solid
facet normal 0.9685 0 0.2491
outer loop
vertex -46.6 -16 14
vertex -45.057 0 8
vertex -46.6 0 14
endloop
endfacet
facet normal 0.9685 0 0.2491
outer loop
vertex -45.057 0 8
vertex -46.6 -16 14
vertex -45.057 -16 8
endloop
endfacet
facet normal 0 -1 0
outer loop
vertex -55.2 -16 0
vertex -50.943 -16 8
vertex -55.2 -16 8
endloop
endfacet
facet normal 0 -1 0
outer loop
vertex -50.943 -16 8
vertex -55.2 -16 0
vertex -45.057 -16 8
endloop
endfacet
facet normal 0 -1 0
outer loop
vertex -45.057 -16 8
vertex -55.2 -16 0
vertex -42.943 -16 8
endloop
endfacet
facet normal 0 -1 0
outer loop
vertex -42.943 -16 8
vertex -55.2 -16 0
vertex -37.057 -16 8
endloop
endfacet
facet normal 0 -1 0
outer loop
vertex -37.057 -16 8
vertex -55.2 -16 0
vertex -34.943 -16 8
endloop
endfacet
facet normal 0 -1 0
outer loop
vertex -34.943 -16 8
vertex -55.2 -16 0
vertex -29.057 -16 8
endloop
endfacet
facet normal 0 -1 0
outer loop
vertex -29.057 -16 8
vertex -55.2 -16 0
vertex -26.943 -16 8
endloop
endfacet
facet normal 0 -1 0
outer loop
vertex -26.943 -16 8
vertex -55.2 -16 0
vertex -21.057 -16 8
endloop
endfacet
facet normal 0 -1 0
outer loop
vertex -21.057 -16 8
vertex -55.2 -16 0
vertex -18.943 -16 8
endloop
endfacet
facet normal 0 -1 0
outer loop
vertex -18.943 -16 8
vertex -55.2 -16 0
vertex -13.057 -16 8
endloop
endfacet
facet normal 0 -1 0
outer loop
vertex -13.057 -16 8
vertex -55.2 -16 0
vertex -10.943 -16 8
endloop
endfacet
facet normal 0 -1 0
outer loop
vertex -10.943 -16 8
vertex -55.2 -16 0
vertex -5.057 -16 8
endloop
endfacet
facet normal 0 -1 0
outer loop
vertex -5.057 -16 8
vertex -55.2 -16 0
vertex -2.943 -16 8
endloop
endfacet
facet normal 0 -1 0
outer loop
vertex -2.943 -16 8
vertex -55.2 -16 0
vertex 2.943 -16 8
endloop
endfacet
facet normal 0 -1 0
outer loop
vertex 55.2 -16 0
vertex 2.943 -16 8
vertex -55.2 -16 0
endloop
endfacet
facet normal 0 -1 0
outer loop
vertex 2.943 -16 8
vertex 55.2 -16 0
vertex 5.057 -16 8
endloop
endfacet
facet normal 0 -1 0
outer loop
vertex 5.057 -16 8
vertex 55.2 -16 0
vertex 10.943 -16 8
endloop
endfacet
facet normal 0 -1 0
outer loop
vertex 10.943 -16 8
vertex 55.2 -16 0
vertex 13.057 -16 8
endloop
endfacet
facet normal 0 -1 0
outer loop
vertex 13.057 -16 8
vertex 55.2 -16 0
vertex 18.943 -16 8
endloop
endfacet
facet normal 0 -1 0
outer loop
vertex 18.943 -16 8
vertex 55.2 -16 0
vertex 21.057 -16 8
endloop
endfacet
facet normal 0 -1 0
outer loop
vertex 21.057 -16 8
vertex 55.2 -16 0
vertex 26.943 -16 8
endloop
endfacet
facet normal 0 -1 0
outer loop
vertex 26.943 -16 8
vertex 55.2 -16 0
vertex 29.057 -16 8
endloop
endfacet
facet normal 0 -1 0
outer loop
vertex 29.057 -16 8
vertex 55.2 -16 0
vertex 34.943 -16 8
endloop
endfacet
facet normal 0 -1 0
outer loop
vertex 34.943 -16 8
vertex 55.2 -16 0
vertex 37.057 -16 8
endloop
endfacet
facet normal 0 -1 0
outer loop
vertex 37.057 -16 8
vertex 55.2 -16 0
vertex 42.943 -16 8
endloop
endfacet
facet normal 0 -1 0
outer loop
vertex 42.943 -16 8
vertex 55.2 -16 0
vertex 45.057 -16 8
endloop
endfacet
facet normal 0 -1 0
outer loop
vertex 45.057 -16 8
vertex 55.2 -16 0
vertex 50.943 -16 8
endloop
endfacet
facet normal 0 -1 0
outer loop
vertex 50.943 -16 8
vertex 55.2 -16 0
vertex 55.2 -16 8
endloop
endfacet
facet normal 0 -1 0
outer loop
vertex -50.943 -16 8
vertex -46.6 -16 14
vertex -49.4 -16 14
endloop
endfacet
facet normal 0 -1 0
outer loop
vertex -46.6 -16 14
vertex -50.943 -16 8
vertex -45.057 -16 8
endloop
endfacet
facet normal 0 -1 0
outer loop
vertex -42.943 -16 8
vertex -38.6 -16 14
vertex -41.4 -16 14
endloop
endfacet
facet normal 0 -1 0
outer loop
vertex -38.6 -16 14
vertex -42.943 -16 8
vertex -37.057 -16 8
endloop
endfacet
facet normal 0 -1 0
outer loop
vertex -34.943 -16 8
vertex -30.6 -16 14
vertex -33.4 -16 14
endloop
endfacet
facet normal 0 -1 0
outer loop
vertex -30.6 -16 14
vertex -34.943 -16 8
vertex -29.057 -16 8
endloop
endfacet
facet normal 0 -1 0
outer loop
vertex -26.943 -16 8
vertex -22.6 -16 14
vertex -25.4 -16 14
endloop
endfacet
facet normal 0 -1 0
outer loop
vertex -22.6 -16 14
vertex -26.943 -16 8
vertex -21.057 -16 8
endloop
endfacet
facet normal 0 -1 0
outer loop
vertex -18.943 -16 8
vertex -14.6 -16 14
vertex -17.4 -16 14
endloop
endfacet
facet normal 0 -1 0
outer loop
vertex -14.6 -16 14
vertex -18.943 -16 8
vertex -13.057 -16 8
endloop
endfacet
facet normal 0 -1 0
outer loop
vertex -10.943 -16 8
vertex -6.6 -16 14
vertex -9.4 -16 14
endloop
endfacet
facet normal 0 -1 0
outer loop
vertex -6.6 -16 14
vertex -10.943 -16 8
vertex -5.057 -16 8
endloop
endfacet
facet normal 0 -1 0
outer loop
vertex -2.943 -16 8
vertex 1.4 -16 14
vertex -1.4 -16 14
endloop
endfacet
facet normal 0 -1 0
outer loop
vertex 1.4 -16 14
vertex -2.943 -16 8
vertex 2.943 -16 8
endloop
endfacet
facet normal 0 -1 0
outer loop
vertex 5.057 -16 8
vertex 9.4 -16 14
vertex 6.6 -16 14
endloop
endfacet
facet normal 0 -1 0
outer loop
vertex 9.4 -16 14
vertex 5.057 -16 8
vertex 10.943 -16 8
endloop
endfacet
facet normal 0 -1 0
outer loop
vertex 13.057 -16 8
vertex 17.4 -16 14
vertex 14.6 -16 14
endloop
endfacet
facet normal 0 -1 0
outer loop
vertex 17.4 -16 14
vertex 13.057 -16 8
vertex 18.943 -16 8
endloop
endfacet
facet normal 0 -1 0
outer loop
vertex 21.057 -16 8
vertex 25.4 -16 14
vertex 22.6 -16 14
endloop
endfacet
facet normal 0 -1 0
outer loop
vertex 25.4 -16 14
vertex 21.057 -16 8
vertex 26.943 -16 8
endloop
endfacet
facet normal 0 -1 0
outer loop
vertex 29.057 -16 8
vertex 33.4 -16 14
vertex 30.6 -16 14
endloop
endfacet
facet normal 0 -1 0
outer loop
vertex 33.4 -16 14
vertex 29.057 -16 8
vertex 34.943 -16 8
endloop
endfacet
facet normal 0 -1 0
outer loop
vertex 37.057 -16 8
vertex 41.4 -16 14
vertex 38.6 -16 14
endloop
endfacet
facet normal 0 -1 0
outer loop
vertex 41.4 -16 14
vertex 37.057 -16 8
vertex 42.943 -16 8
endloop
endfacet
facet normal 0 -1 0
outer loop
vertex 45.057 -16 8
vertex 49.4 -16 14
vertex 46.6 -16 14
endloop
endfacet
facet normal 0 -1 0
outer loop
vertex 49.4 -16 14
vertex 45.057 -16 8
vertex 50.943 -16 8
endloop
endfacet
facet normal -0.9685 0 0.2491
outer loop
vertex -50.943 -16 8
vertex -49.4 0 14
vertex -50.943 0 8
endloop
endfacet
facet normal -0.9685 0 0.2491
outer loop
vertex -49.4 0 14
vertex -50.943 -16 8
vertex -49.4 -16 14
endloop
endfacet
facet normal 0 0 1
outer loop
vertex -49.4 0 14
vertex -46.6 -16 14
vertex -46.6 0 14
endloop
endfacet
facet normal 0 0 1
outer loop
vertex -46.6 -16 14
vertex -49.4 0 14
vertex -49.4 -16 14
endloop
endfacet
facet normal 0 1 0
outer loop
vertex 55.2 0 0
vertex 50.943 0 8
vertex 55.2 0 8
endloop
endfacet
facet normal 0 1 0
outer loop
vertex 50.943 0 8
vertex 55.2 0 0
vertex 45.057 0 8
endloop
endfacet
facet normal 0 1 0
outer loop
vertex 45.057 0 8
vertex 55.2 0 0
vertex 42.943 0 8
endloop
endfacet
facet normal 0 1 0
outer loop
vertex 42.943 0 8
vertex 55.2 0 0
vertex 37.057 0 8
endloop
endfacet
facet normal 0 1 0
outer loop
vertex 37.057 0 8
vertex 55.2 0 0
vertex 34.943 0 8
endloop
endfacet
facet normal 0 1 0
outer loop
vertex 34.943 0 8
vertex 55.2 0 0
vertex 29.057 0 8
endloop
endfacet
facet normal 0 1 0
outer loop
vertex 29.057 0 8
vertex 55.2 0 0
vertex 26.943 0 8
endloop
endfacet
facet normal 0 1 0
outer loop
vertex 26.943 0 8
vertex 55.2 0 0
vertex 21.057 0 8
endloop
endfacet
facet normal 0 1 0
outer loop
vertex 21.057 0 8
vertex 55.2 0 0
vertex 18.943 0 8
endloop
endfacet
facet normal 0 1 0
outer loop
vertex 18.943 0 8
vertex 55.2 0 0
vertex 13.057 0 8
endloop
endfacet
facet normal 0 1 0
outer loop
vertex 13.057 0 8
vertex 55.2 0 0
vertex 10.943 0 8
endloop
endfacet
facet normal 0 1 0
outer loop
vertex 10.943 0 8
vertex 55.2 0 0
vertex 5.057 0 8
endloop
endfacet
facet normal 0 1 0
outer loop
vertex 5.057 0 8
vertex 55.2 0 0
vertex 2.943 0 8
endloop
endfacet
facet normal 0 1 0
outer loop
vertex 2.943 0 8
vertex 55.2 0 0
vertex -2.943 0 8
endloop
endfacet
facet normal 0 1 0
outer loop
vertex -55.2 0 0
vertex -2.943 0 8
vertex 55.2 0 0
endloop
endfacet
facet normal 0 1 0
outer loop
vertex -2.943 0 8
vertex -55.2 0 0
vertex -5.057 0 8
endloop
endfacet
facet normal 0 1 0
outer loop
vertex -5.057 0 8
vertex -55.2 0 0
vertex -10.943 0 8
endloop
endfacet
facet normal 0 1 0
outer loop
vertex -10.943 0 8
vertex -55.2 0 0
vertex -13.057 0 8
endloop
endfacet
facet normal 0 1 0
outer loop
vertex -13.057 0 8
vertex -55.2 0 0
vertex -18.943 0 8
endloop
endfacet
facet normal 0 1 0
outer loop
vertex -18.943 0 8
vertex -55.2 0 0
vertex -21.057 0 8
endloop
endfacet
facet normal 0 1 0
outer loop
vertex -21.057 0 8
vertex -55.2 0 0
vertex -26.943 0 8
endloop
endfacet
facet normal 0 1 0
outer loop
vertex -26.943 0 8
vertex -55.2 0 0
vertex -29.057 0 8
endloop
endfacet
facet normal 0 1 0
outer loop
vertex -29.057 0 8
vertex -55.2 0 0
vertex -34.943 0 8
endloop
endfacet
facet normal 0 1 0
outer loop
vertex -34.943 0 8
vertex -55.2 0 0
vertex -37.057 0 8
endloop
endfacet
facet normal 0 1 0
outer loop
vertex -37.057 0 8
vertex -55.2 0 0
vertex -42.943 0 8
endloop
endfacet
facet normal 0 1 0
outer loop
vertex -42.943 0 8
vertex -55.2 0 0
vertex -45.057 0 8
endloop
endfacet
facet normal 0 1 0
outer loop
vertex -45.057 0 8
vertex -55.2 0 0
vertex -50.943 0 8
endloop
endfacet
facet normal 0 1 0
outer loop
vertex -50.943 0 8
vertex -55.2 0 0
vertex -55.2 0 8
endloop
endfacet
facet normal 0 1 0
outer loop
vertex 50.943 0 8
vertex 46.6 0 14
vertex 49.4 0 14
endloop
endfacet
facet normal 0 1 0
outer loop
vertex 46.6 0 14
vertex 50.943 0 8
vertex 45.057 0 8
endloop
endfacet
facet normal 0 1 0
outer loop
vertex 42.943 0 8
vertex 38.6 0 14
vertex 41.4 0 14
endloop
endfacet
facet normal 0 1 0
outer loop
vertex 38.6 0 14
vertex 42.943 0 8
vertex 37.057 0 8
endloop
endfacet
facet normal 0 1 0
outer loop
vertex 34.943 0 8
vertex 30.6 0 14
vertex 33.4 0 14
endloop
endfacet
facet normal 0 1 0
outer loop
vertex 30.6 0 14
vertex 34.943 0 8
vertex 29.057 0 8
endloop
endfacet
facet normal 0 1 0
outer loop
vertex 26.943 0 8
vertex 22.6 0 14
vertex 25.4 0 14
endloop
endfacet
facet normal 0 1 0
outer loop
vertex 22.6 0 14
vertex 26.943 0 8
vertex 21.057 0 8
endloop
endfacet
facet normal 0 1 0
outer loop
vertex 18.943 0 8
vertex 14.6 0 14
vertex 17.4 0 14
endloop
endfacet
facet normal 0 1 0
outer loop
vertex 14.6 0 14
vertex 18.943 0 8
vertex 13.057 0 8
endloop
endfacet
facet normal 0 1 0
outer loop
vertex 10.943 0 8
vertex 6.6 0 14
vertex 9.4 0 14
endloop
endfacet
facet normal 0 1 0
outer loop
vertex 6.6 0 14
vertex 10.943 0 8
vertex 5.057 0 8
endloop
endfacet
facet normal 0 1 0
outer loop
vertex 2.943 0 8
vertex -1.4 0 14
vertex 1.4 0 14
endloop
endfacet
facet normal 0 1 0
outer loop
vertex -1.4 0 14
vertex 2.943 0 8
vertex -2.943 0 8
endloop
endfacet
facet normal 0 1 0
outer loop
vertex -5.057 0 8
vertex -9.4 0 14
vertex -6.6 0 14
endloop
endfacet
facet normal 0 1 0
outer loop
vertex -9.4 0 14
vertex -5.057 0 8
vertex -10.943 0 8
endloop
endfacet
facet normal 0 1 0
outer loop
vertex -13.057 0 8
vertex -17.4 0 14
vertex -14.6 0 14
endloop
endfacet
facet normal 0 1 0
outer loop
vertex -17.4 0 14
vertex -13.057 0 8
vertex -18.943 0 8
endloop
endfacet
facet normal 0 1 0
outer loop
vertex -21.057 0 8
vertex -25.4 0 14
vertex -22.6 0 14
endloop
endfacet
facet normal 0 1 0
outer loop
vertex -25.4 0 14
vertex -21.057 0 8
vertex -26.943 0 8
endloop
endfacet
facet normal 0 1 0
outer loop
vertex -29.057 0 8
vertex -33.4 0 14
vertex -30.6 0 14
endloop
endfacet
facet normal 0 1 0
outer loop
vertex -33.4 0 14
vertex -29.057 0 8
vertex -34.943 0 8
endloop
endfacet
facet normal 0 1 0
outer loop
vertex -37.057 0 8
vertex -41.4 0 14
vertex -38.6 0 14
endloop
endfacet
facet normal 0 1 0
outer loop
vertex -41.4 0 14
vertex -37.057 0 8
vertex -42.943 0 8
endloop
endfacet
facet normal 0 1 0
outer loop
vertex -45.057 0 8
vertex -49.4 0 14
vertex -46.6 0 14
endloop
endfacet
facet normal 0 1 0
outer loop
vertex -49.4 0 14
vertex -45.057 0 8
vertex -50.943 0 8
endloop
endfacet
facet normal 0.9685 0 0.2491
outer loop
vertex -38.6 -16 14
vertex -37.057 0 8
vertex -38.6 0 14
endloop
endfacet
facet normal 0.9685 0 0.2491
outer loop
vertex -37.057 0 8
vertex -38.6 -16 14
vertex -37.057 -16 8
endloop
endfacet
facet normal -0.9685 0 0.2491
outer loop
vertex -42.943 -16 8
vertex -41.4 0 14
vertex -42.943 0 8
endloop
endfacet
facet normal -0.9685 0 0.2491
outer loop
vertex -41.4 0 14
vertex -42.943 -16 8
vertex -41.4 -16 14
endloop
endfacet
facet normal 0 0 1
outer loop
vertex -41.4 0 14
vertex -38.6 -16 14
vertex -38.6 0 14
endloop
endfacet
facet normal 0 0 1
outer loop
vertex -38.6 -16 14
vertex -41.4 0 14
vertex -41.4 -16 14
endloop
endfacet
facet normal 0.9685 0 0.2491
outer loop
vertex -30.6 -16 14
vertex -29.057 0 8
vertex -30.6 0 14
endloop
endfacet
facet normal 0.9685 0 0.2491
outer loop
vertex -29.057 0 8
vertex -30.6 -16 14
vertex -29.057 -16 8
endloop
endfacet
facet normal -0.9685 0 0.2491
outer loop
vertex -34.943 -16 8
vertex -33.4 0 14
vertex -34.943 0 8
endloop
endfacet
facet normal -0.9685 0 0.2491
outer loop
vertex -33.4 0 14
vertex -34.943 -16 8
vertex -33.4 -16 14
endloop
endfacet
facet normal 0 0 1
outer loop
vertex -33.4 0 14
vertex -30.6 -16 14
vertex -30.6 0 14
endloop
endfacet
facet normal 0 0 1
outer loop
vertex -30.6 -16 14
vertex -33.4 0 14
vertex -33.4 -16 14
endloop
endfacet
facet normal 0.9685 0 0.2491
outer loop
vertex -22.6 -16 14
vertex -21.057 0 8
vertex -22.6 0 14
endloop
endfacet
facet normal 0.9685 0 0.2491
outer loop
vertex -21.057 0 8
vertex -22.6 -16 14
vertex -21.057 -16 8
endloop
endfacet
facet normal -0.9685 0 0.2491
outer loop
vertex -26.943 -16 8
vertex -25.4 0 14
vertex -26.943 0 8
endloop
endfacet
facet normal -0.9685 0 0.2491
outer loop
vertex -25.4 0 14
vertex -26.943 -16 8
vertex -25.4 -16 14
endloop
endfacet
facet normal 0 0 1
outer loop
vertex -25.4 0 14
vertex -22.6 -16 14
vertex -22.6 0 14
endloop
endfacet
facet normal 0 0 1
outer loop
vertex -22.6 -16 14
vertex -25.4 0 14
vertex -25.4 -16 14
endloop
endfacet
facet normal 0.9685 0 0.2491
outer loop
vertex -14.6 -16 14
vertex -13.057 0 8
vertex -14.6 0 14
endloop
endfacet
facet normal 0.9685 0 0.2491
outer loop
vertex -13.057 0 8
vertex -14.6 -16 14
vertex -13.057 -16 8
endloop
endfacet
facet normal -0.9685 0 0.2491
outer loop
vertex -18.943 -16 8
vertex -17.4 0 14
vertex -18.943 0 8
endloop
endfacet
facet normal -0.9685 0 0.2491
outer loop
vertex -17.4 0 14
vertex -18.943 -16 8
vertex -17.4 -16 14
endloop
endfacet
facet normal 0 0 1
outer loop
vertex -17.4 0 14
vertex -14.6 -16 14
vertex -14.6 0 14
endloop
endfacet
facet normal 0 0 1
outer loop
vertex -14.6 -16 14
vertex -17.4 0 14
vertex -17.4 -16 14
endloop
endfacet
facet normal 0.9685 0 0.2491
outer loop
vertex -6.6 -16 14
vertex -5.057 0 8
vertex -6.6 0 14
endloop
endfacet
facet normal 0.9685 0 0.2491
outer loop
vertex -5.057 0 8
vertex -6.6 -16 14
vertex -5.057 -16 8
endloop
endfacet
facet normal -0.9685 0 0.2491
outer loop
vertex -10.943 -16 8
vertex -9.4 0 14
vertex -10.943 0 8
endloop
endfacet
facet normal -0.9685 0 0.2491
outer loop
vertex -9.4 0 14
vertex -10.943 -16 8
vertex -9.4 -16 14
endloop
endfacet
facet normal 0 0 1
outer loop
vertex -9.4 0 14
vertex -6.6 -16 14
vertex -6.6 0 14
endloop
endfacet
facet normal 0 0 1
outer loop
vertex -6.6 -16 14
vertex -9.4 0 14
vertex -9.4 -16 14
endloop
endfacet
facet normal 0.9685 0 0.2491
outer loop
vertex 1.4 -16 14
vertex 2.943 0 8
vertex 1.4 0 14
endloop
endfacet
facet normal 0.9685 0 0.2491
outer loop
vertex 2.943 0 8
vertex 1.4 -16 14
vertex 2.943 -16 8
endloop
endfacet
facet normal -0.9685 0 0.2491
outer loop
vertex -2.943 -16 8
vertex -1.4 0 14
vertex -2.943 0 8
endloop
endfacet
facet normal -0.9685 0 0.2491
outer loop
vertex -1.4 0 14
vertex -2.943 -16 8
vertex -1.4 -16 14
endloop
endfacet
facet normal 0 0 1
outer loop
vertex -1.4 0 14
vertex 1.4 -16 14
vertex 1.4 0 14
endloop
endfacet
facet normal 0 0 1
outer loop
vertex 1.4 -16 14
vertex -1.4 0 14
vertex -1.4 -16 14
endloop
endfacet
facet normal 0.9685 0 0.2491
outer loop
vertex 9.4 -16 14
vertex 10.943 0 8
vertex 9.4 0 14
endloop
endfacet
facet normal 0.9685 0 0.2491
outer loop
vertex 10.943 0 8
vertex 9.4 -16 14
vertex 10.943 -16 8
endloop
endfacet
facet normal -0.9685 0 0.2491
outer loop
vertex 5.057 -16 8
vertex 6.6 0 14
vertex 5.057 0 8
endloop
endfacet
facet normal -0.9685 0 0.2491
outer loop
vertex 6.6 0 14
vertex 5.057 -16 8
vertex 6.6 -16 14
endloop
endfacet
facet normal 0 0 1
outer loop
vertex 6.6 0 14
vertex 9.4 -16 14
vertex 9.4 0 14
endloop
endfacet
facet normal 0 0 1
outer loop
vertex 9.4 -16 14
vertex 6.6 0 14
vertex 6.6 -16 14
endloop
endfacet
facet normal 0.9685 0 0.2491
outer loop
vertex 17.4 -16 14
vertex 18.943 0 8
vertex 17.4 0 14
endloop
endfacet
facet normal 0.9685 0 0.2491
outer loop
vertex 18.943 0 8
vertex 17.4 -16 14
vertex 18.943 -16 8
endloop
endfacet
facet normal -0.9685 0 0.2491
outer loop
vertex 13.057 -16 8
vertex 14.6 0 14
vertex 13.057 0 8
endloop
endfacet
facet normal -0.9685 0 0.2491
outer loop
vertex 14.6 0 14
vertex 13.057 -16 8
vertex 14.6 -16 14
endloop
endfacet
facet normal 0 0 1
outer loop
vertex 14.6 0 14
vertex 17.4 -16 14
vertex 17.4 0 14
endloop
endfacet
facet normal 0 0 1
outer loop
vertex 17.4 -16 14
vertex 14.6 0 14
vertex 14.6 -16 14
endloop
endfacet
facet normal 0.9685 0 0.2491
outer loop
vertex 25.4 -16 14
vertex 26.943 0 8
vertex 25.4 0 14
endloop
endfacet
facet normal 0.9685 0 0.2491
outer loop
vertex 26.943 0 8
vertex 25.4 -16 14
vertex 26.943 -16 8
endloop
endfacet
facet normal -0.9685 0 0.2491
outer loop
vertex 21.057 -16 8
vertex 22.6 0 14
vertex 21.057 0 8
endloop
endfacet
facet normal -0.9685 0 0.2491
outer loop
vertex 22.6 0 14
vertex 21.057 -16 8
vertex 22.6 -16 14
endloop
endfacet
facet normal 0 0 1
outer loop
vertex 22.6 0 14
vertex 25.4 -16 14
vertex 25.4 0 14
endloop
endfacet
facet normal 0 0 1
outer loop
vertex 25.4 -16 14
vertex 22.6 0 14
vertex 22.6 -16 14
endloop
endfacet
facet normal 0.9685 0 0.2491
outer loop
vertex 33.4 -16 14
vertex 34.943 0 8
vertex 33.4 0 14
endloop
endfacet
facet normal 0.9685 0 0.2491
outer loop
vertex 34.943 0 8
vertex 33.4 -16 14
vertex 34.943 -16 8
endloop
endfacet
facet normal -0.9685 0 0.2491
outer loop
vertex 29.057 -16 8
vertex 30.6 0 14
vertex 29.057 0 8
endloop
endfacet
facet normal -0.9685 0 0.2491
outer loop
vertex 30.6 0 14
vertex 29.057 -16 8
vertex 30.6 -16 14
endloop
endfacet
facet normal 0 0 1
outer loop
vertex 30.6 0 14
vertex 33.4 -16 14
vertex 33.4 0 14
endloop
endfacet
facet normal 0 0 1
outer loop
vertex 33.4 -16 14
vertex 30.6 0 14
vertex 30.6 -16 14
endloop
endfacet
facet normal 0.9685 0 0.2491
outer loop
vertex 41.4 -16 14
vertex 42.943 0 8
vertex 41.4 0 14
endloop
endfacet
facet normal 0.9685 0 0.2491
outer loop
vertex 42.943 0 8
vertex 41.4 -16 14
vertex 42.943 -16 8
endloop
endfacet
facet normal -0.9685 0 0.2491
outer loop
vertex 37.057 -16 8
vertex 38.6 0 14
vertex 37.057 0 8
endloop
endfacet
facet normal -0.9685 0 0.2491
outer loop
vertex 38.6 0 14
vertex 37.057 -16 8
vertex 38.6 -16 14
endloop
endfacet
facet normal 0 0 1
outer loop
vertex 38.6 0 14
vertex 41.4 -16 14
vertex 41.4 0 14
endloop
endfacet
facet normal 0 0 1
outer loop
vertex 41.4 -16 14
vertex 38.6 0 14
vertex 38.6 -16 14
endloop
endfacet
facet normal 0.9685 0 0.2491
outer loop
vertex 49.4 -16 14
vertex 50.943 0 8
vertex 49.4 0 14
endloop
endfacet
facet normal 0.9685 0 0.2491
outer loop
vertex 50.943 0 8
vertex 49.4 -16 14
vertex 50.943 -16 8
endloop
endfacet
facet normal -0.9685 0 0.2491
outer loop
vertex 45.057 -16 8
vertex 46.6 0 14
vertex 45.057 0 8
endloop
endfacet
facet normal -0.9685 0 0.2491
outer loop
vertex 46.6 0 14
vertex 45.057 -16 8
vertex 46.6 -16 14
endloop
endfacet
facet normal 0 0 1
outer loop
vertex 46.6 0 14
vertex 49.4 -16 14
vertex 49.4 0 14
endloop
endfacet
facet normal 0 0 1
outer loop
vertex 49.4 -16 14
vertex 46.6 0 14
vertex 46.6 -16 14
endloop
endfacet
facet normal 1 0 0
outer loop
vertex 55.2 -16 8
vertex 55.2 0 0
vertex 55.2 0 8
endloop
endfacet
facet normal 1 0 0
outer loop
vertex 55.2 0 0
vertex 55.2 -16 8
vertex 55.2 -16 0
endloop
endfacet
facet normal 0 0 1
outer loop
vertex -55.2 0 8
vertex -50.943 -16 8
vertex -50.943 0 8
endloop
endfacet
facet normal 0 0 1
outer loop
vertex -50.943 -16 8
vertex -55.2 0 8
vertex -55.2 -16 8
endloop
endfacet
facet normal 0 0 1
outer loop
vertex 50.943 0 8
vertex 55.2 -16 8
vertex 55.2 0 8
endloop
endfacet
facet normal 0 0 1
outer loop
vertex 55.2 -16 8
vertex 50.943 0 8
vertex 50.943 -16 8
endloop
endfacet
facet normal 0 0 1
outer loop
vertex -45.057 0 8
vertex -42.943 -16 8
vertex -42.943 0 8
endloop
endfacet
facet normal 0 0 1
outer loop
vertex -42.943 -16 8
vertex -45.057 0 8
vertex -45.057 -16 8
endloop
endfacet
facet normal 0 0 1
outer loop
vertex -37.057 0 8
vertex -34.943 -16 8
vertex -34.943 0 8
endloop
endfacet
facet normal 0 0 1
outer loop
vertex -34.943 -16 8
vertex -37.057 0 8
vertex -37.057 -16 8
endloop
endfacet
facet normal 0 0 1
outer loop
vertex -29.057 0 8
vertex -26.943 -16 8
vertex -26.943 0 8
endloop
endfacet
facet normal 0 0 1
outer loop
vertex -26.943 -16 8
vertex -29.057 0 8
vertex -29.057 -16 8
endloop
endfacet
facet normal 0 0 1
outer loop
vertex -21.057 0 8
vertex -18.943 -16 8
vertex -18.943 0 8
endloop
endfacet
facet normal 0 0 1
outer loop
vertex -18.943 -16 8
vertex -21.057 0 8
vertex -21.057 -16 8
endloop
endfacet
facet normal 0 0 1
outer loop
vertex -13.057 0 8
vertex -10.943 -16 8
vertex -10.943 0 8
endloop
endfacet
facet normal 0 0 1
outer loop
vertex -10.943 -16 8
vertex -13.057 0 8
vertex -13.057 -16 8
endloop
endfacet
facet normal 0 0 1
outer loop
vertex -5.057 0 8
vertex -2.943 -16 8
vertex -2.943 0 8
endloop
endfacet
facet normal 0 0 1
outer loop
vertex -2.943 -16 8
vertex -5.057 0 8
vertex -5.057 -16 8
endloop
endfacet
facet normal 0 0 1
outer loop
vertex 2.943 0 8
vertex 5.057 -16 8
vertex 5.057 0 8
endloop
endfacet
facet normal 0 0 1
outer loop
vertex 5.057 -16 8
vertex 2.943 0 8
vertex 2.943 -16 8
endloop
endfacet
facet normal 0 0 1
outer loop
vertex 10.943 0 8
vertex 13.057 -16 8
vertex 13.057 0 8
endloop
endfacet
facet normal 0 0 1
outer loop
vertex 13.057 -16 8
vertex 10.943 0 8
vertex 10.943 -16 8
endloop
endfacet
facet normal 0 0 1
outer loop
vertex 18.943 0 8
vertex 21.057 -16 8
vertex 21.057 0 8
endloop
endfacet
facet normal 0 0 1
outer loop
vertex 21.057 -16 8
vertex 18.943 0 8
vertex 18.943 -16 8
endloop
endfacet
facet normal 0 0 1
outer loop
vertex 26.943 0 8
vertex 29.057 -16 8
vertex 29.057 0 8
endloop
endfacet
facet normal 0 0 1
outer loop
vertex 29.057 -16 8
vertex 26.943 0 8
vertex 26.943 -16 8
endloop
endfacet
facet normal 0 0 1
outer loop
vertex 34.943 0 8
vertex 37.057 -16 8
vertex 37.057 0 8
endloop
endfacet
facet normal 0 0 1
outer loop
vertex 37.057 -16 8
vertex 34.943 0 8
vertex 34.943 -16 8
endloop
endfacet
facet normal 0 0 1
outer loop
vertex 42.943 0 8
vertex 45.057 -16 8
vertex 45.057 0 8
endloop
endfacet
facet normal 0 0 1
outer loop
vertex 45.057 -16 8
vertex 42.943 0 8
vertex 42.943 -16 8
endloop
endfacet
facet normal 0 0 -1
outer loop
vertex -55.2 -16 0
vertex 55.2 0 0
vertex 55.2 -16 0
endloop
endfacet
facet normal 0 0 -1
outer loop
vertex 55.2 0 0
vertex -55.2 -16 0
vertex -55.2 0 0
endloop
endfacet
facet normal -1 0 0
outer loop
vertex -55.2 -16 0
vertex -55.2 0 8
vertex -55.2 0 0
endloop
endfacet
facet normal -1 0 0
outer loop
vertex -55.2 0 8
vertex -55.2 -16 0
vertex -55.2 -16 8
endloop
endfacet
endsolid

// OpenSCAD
$fn = 32;

// ----------------------------------------------------------------------
// Toothed rack, 13 teeth
// 8 mm pitch, 6 mm teeth
// ----------------------------------------------------------------------

// --- parameters (mm) ---
bar_w = 16;     // bar width (Y)
bar_h = 8;      // bar height (Z)
teeth = 13;     // number of teeth
pitch = 8;      // tooth pitch
tooth_h = 6;    // tooth height above the bar
root_w = 6.4;   // tooth width at the root
crest_w = 2.8;  // tooth width at the crest

// --- derived feature positions (mm) ---
span = (teeth - 1) * pitch;  // = 96   distance between the outer teeth
bar_l = span + root_w + 8;   // = 110.4   bar length: teeth plus 4 mm at each end
tooth_x = -span / 2;         // = -48   X of the first tooth
height = bar_h + tooth_h;    // = 14   overall height
feature_centers = [
  [tooth_x + 0 * pitch, -bar_w / 2],
  [tooth_x + 1 * pitch, -bar_w / 2],
  [tooth_x + 2 * pitch, -bar_w / 2],
  [tooth_x + 3 * pitch, -bar_w / 2],
  [tooth_x + 4 * pitch, -bar_w / 2],
  [tooth_x + 5 * pitch, -bar_w / 2],
  [tooth_x + 6 * pitch, -bar_w / 2],
  [tooth_x + 7 * pitch, -bar_w / 2],
  [tooth_x + 8 * pitch, -bar_w / 2],
  [tooth_x + 9 * pitch, -bar_w / 2],
  [tooth_x + 10 * pitch, -bar_w / 2],
  [tooth_x + 11 * pitch, -bar_w / 2],
  [tooth_x + 12 * pitch, -bar_w / 2]
];   // tooth centre line, drives the tooth loop

// bar with a rack of teeth, one extruded trapezoium per centre
module rack_tooth() {
  linear_extrude(height = bar_w)
    polygon(points = [
      [0, 0],
      [root_w, 0],
      [root_w / 2 + crest_w / 2, tooth_h + 1],
      [root_w / 2 - crest_w / 2, tooth_h + 1]
    ]);
}

union() {
  translate([-bar_l / 2, -bar_w, 0]) cube([bar_l, bar_w, bar_h]);
  for (centre = feature_centers)
    translate([centre[0] - root_w / 2, 0, bar_h - 1]) rotate([90, 0, 0]) rack_tooth();
}
